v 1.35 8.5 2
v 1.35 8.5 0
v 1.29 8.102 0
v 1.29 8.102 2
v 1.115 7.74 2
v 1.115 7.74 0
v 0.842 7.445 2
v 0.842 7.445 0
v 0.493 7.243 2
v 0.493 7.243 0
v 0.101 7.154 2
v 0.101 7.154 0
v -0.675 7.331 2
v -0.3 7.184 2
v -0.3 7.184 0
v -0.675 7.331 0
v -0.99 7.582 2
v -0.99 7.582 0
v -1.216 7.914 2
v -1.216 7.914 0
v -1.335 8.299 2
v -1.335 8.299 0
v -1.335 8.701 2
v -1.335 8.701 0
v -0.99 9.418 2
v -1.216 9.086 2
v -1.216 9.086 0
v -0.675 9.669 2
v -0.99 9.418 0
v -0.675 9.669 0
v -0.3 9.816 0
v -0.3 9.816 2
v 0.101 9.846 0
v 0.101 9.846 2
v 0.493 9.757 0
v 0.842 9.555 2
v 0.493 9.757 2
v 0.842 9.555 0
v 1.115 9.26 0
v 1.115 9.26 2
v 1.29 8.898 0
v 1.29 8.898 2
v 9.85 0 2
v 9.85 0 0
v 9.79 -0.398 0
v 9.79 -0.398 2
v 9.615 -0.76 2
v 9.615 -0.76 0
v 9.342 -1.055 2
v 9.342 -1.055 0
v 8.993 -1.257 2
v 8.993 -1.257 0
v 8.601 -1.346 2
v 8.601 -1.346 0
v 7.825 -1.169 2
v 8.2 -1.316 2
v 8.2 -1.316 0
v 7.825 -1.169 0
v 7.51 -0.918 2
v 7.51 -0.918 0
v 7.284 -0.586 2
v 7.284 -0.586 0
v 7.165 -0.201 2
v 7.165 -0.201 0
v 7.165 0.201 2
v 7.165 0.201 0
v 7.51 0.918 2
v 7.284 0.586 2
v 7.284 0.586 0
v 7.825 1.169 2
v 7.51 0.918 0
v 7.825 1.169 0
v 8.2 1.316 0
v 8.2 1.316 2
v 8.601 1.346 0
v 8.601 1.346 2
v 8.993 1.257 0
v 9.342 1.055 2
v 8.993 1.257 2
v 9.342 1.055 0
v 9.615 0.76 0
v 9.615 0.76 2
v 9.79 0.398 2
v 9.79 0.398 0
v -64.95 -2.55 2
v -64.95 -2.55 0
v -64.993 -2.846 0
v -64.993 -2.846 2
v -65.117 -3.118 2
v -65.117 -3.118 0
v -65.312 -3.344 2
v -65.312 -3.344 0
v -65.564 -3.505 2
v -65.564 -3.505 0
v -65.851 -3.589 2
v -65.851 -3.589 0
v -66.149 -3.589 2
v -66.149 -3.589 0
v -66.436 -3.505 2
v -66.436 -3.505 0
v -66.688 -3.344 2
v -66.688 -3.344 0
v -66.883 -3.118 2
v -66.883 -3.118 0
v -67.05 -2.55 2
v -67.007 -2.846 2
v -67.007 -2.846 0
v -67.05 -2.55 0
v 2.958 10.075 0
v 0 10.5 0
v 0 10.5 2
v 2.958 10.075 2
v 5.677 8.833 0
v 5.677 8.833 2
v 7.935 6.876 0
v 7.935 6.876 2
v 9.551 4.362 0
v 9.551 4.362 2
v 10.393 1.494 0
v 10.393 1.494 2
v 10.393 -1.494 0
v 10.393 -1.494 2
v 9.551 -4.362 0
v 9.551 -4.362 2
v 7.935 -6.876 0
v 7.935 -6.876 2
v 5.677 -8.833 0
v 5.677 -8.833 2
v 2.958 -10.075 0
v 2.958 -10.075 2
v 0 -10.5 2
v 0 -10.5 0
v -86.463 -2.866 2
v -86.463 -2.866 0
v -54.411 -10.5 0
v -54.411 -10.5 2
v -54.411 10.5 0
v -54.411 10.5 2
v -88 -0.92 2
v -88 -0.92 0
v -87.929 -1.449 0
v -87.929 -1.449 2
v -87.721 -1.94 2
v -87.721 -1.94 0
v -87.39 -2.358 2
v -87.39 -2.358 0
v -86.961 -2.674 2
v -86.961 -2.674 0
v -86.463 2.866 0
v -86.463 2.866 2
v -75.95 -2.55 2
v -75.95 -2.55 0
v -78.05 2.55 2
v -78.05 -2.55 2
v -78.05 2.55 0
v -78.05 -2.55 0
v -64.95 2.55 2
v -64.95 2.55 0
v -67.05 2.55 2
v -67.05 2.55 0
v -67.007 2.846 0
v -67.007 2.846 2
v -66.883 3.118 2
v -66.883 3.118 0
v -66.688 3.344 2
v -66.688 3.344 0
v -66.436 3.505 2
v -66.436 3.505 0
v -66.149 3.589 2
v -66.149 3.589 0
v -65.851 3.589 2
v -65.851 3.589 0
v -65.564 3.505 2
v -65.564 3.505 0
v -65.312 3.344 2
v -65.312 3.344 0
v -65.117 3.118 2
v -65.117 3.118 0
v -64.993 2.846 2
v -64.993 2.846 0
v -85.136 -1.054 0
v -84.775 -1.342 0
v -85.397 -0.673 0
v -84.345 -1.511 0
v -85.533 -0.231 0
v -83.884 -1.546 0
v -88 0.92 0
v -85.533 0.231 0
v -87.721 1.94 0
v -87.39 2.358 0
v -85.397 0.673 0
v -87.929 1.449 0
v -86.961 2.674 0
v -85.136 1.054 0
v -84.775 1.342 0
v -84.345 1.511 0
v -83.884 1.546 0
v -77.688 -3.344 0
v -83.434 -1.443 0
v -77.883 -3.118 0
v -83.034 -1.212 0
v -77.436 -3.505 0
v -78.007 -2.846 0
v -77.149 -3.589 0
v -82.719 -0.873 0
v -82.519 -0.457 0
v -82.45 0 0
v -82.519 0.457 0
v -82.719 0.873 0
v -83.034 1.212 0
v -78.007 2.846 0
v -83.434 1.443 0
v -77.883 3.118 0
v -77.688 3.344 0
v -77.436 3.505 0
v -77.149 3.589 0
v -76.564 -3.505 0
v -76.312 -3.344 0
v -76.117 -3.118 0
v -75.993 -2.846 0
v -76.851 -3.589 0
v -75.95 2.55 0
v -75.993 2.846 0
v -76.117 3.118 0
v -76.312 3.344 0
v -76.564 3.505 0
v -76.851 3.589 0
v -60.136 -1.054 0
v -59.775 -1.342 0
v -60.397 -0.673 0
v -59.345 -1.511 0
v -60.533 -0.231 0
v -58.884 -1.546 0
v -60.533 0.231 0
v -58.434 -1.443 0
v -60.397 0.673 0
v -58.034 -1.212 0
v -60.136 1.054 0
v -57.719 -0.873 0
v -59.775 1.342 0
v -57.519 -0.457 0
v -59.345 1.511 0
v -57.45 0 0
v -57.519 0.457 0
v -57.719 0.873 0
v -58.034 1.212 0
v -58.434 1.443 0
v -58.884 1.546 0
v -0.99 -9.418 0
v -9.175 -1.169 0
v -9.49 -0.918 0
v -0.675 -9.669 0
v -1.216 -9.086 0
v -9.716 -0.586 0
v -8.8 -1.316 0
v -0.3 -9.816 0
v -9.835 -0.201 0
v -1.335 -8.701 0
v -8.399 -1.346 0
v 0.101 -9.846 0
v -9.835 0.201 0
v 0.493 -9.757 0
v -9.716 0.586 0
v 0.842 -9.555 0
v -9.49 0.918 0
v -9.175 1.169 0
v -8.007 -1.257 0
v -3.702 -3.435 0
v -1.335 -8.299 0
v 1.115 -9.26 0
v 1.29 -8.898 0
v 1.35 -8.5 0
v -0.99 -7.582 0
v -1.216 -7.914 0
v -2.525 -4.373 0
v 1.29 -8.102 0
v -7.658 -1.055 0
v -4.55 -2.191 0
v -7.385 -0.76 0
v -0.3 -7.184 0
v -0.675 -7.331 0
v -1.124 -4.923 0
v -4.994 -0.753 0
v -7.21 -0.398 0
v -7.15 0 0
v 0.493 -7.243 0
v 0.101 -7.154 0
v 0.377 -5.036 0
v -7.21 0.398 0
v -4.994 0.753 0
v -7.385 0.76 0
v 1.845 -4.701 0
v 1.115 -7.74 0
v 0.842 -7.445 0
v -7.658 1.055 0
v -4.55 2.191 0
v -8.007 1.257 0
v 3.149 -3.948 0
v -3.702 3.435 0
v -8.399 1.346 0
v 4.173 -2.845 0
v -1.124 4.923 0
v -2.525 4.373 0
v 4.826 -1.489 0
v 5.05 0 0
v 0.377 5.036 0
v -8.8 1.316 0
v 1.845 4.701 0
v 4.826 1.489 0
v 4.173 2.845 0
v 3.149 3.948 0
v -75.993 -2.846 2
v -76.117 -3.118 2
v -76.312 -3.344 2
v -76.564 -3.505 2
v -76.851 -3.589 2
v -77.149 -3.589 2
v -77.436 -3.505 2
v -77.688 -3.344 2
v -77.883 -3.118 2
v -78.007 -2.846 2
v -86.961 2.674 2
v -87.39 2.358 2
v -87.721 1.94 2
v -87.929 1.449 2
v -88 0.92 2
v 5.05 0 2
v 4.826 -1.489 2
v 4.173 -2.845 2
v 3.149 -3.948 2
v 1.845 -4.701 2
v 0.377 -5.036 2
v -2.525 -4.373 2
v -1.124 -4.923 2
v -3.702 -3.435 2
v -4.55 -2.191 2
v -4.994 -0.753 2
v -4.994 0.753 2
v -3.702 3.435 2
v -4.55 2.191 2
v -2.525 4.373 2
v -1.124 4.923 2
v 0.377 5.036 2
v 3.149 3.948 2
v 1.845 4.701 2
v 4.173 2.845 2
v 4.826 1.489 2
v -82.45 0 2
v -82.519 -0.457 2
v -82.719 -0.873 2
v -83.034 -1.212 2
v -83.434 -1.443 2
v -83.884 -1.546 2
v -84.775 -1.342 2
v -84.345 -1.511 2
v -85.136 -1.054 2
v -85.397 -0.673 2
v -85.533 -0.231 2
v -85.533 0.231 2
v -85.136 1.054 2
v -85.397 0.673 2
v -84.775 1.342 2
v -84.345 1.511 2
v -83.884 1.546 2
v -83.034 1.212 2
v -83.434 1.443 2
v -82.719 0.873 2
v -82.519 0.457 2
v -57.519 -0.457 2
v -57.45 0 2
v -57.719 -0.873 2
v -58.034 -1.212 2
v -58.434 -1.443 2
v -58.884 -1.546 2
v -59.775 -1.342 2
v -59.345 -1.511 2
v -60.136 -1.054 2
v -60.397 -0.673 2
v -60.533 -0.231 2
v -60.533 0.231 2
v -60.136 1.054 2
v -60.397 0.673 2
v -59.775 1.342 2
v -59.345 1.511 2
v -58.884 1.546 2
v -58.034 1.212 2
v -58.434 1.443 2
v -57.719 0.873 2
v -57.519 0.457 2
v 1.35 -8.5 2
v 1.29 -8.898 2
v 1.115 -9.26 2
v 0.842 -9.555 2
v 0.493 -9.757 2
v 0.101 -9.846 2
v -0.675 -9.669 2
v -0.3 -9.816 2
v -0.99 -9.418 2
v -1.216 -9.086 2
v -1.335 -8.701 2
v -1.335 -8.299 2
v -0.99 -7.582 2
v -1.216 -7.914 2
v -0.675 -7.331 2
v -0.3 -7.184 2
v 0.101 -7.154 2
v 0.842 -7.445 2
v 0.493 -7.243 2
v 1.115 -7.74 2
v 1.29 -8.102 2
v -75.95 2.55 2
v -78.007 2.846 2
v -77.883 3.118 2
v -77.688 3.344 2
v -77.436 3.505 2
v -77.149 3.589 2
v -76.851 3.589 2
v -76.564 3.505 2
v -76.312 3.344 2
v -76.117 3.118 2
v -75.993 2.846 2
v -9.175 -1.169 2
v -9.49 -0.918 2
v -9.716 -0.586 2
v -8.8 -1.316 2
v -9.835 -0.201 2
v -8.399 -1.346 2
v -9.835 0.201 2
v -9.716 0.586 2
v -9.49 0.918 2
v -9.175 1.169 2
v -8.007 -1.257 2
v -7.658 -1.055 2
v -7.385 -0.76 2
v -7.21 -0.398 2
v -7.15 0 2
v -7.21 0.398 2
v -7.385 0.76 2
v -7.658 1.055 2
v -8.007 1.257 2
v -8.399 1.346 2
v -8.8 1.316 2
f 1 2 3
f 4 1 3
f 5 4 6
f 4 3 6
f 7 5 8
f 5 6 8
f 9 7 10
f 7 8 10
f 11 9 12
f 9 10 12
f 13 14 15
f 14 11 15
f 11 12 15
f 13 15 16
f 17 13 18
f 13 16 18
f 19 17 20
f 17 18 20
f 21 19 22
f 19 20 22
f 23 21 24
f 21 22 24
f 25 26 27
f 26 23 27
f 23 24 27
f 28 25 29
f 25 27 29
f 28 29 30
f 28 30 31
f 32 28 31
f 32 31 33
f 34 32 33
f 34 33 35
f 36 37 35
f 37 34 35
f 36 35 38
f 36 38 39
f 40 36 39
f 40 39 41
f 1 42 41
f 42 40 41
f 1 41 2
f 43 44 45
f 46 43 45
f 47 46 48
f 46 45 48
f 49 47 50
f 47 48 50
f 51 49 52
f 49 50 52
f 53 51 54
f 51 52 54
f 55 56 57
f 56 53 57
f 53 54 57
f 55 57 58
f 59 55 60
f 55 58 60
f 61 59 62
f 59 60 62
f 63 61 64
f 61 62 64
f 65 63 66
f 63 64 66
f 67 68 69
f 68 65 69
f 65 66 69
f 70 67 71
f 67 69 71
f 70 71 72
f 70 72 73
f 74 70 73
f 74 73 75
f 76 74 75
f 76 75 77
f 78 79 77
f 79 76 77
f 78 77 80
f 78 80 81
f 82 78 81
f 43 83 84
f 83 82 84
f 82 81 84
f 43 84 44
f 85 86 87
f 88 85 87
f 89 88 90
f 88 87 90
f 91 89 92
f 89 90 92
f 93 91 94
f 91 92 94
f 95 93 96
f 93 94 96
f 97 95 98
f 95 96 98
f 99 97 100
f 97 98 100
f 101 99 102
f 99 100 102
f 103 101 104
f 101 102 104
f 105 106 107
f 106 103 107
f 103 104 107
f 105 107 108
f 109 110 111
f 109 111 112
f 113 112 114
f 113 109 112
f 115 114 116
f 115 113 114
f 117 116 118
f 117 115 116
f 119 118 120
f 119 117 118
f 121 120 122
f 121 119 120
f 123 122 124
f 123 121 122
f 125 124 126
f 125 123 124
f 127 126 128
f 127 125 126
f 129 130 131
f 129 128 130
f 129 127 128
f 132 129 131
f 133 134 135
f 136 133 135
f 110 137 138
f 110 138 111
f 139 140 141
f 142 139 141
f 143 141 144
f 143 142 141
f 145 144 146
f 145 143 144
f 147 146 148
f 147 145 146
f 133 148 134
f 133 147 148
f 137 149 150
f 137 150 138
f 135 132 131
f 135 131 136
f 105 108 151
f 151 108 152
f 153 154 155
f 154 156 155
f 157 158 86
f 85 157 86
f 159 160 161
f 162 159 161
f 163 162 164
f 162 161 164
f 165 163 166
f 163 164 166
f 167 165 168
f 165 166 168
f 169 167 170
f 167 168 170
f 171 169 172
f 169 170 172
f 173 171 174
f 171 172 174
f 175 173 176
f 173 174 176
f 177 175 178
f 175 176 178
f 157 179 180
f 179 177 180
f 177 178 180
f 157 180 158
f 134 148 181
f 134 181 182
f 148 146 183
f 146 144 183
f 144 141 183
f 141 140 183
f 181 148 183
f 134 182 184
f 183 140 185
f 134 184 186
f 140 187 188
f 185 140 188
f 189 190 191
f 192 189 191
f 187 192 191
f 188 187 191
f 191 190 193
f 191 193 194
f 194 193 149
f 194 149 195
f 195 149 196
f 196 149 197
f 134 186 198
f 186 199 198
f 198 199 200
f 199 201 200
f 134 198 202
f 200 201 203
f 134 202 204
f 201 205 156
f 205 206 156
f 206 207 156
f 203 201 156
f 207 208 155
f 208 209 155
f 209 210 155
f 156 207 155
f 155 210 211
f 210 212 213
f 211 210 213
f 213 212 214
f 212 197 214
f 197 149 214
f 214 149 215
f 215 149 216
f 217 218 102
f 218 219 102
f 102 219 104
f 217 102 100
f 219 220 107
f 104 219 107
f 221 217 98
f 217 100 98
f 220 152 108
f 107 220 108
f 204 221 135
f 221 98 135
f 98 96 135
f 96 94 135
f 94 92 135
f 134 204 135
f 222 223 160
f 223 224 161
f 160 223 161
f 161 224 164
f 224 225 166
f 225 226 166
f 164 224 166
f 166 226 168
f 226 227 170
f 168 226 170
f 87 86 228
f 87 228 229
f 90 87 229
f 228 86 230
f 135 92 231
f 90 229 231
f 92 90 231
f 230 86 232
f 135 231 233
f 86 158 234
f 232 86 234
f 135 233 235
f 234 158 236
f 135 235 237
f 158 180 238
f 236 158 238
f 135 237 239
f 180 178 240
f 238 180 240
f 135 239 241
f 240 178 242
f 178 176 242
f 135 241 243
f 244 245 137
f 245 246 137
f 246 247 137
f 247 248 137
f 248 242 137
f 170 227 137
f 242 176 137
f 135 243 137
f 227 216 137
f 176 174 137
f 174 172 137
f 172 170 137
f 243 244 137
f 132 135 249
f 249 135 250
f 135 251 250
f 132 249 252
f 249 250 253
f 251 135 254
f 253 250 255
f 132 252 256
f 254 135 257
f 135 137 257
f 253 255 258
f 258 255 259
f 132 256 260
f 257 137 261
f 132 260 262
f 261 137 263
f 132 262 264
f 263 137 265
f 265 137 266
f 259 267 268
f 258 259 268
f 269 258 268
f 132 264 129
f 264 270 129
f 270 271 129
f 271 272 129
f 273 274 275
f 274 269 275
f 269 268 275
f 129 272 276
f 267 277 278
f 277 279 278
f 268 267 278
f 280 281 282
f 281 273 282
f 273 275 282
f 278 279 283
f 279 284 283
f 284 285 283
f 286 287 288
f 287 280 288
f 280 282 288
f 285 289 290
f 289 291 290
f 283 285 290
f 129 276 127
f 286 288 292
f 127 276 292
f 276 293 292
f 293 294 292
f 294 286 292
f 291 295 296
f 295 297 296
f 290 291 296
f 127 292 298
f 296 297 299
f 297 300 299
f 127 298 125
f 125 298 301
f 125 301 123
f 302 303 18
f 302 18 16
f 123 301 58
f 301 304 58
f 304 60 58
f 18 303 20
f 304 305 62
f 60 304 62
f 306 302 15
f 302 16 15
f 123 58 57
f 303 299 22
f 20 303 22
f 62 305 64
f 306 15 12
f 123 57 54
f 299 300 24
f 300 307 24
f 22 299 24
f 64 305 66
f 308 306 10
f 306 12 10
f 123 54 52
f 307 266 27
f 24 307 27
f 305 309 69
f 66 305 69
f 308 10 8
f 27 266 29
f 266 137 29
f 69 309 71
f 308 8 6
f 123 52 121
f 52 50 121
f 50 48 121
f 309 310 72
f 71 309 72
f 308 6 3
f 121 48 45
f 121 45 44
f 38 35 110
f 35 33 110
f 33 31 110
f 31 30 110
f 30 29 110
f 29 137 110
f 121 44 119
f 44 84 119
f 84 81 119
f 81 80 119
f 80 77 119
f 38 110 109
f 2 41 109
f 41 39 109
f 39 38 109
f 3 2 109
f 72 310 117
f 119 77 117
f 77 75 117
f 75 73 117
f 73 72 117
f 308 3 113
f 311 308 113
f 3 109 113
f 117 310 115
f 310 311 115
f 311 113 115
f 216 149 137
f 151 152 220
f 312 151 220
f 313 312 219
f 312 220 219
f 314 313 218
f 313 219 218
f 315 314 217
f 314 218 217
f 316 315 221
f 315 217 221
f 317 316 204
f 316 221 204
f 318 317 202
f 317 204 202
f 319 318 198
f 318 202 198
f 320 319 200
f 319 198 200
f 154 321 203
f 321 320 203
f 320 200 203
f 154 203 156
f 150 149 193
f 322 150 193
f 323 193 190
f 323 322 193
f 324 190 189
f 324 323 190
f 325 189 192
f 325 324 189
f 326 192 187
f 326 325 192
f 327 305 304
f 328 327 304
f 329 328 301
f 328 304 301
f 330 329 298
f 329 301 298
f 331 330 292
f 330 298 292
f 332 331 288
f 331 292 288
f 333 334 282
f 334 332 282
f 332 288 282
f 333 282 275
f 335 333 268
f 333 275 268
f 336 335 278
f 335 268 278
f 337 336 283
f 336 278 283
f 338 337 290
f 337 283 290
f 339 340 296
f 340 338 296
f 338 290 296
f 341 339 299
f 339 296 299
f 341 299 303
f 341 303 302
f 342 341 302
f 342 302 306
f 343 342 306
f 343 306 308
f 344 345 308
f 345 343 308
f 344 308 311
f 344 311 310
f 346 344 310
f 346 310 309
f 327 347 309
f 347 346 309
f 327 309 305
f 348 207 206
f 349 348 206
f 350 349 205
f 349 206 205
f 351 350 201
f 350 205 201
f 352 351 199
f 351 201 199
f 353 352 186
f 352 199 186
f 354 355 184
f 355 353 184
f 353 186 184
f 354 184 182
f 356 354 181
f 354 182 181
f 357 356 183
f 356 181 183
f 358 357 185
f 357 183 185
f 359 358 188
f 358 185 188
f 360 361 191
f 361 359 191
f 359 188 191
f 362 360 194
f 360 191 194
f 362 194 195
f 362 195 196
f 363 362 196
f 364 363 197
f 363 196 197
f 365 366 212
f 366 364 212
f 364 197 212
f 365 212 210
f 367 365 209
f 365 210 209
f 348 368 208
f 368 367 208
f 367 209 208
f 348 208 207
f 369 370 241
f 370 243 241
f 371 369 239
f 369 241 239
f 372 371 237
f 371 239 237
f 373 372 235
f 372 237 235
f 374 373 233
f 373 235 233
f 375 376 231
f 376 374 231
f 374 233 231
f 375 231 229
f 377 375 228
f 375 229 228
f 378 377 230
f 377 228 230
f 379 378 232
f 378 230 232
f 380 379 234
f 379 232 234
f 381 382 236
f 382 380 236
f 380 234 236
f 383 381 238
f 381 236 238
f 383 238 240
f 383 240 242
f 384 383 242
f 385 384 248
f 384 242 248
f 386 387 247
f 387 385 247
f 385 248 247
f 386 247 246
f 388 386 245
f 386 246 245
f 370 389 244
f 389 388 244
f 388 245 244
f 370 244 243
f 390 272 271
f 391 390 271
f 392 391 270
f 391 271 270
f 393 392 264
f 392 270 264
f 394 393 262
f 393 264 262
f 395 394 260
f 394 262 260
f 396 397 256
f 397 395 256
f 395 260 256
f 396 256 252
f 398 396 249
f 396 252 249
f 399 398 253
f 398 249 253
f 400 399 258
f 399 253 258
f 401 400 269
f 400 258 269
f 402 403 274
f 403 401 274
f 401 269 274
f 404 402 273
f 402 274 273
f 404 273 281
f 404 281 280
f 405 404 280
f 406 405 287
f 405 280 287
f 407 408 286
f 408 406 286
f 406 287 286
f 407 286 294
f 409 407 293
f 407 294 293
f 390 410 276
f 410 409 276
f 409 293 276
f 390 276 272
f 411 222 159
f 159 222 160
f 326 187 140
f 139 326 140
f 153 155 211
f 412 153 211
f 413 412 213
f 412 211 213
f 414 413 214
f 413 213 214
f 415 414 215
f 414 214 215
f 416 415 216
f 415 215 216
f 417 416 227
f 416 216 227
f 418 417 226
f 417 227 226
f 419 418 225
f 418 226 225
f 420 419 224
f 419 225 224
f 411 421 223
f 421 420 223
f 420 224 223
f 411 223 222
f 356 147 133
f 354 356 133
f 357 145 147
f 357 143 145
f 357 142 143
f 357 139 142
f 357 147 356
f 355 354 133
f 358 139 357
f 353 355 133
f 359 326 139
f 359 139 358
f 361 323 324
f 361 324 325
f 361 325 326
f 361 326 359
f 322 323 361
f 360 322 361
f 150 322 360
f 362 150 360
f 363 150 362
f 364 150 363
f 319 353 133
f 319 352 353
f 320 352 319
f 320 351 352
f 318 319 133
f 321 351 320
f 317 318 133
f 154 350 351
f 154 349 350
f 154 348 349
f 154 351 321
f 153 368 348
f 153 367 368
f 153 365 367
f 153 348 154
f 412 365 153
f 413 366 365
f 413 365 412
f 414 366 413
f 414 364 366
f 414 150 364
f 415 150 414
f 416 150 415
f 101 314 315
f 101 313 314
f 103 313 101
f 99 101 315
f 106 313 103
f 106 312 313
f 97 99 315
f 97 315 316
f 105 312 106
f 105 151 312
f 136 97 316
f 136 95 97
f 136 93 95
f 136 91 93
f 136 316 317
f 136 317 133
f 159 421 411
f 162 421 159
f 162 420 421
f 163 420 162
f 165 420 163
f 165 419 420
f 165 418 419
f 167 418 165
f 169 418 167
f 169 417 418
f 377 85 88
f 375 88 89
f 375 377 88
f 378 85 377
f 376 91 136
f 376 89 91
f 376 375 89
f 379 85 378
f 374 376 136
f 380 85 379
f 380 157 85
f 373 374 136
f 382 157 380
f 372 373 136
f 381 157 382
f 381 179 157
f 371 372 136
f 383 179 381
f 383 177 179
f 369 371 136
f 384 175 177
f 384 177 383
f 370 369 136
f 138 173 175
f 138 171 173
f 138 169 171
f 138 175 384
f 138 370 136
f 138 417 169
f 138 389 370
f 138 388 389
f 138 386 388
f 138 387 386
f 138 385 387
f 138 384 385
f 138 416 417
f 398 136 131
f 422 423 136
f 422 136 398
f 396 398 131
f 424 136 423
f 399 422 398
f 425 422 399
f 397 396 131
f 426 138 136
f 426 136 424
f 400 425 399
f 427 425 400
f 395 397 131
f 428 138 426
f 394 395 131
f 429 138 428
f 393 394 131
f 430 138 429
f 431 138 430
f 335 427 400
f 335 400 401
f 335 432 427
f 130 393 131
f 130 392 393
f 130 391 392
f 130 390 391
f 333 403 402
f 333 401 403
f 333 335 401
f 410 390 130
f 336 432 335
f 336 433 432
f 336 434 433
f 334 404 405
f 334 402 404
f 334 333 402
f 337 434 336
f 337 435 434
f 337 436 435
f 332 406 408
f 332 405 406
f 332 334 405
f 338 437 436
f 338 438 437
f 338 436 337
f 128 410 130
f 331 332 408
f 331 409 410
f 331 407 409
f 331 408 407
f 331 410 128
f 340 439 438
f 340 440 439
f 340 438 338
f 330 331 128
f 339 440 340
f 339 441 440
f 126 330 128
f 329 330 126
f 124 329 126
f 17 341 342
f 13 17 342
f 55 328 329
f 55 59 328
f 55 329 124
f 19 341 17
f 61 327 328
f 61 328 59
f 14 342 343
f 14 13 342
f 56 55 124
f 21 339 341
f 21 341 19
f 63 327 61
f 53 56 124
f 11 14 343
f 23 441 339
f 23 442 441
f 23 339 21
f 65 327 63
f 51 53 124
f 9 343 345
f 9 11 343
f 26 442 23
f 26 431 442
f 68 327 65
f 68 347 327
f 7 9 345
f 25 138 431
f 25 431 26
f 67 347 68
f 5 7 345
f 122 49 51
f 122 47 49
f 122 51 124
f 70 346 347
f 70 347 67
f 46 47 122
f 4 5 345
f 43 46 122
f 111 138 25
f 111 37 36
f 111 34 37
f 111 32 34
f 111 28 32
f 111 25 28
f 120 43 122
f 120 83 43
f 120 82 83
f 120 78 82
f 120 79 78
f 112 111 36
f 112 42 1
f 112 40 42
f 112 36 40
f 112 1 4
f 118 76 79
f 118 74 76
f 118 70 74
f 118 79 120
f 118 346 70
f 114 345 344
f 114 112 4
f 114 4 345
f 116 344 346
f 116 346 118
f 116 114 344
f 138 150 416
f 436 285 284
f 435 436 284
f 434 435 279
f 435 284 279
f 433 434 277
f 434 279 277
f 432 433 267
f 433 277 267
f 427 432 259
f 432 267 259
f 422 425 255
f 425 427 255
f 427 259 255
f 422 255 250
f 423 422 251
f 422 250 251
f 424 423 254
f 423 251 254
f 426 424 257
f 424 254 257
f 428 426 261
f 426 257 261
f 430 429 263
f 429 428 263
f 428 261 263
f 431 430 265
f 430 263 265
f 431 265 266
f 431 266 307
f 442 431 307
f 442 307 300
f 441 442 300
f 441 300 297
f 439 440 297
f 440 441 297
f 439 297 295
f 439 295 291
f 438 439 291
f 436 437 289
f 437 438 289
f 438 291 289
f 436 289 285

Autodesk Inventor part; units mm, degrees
ref_plane "YZ Plane" through (0, 0, 0) normal (1, 0, 0) x (0, 1, 0)
ref_plane "XZ Plane" through (0, 0, 0) normal (0, 1, 0) x (-1, 0, 0)
ref_plane "XY Plane" through (0, 0, 0) normal (0, 0, 1) x (1, 0, 0)
sketch "スケッチ1" plane through (0, 0, 0) normal (0, 0, 1) x (1, 0, 0)
  circle A0 centre (0, 0) radius 10.5 construction
  line L0 (0, 10.5) -> (-200, 10.5) construction
  line L1 (-200, 10.5) -> (-200, -10.5) construction
  line L2 (-200, -10.5) -> (0, -10.5) construction
  circle A1 centre (-195, 0) radius 1.55 construction
  line L3 (-185, 2.5) -> (-70, 2.5) construction
  line L4 (-70, 2.5) -> (-70, -2.5) construction
  line L5 (-70, -2.5) -> (-185, -2.5) construction
  line L6 (-185, -2.5) -> (-185, 2.5) construction
  line L7 (-127.5, 2.5) -> (-127.5, -2.5) construction
  circle A2 centre (-60, 0) radius 1.55 construction
  line L8 (-12, 21.3027) -> (-12, -27.3903) construction
  line L9 (-69.95, 2.55) -> (-185.05, 2.55) construction
  line L10 (-185.05, 2.55) -> (-185.05, -2.55) construction
  line L11 (-185.05, -2.55) -> (-69.95, -2.55) construction
  line L12 (-69.95, -2.55) -> (-69.95, 2.55) construction
  circle A3 centre (-184, 2.55) radius 1.05 construction
  line L13 (-185, 0) -> (-127.5, 0) construction
  line L14 (-185.05, 2.55) -> (-185.05, -2.55) construction
  arc A4 (-182.95, 2.55) -> (-185.05, 2.55) centre (-184, 2.55) ccw construction
  line L15 (-182.95, 2.55) -> (-72.05, 2.55) construction
  arc A5 (-69.95, 2.55) -> (-72.05, 2.55) centre (-71, 2.55) ccw construction
  line L16 (-69.95, 2.55) -> (-69.95, -2.55) construction
  arc A6 (-185.05, -2.55) -> (-182.95, -2.55) centre (-184, -2.55) ccw construction
  line L17 (-182.95, -2.55) -> (-72.05, -2.55) construction
  arc A7 (-72.05, -2.55) -> (-69.95, -2.55) centre (-71, -2.55) ccw construction
  circle A8 centre (0, 8.5) radius 1.35
  circle A9 centre (0, 0) radius 5.05
  circle A10 centre (-8.5, 0) radius 1.35
  circle A11 centre (0, -8.5) radius 1.35
  circle A12 centre (8.5, 0) radius 1.35
  line L18 (-200, 4.8006) -> (-200, -4.8006) construction
  line L19 (-200, 4.8006) -> (-60, 10.5) construction
  line L20 (-60, 10.5) -> (0, 10.5) construction
  line L21 (-200, -4.8006) -> (-60, -10.5) construction
  line L22 (-60, -10.5) -> (0, -10.5) construction
  arc A13 (0, -10.5) -> (0, 10.5) centre (0, 0) ccw construction
  circle A14 centre (-195, 0) radius 5 construction
  circle A15 centre (-59, 0) radius 1.55
  circle A16 centre (-84, 0) radius 1.55
  line L23 (-55, -2.5) -> (-88, -2.5) construction
  line L24 (-88, -2.5) -> (-88, 2.5) construction
  line L25 (-88, 2.5) -> (-55, 2.5) construction
  line L26 (-55, 2.5) -> (-55, -2.5) construction
  line L27 (-65, -2.5) -> (-78, -2.5) construction
  line L28 (-78, -2.5) -> (-78, 2.5) construction
  line L29 (-78, 2.5) -> (-65, 2.5) construction
  line L30 (-65, 2.5) -> (-65, -2.5) construction
  line L31 (-64.95, -2.55) -> (-78.05, -2.55)
  line L32 (-78.05, -2.55) -> (-78.05, 2.55)
  line L33 (-78.05, 2.55) -> (-64.95, 2.55)
  line L34 (-64.95, 2.55) -> (-64.95, -2.55)
  circle A17 centre (-66, -2.55) radius 1.05
  circle A18 centre (-66, 2.55) radius 1.05
  circle A19 centre (-77, -2.55) radius 1.05
  circle A20 centre (-77, 2.55) radius 1.05
  line L35 (-88, 2.5) -> (-88, -2.5)
  line L36 (-88, -2.5) -> (-54.4113, -10.5)
  line L37 (-88, 2.5) -> (-54.4113, 10.5)
  arc A21 (0, -10.5) -> (0, 10.5) centre (0, 0) ccw
  line L38 (-54.4113, 10.5) -> (0, 10.5)
  line L39 (0, -10.5) -> (-54.4113, -10.5)
  circle A22 centre (-77, 2.55) radius 2.5 construction
  circle A23 centre (0, 0) radius 16 construction
  circle A24 centre (0, 0) radius 21 construction
  line L40 (-21, 19.3585) -> (-21, -28.09) construction
  point P0 (-200, 0)
  point P1 (-55, 0)
  dimension "d9" = 2.1
  dimension "d29" = 2.1
  dimension "d0" = 200
  dimension "d1" = 3.1
  dimension "d2" = 21
  dimension "d3" = 10
  dimension "d4" = 5
  dimension "d5" = 12
  dimension "d6" = 135
  dimension "d7" = 5
  dimension "d8" = 0.05
  dimension "d10" = 2.7
  dimension "d11" = 8.5
  dimension "d12" = 10.1
  dimension "d15" = 360
  dimension "d20" = 3.1
  dimension "d21" = 5
  dimension "d22" = 4
  dimension "d23" = 5
  dimension "d24" = 25
  dimension "d26" = 10
  dimension "d27" = 4
  dimension "d28" = 10
  dimension "d30" = 0.05
  dimension "d32" = 5
  dimension "d33" = 32
  dimension "d34" = 5
extrude "押し出し1" add sketch "スケッチ1" along normal blind 2
fillet "フィレット2" radius 2 2 edges at (-88, 2.5, 1) (-88, -2.5, 1)
equation "\"d0\" = d0_1"
equation "\"d2\" = d2_1"
equation "\"d3\" = d3_1"
equation "\"d4\" = d4_1"
equation "\"d6\" = d6_1"
equation "\"d21\" = d4"
equation "\"d27\" = d22"
equation "\"d28\" = d26"
equation "\"d2_1\" = 21"
equation "\"d3_1\" = 10"
equation "\"d4_1\" = 5"
equation "\"d6_1\" = 135"
equation "\"d0_1\" = 200"
properties part number "ForeArm_inside_frame" material "GFRP"
